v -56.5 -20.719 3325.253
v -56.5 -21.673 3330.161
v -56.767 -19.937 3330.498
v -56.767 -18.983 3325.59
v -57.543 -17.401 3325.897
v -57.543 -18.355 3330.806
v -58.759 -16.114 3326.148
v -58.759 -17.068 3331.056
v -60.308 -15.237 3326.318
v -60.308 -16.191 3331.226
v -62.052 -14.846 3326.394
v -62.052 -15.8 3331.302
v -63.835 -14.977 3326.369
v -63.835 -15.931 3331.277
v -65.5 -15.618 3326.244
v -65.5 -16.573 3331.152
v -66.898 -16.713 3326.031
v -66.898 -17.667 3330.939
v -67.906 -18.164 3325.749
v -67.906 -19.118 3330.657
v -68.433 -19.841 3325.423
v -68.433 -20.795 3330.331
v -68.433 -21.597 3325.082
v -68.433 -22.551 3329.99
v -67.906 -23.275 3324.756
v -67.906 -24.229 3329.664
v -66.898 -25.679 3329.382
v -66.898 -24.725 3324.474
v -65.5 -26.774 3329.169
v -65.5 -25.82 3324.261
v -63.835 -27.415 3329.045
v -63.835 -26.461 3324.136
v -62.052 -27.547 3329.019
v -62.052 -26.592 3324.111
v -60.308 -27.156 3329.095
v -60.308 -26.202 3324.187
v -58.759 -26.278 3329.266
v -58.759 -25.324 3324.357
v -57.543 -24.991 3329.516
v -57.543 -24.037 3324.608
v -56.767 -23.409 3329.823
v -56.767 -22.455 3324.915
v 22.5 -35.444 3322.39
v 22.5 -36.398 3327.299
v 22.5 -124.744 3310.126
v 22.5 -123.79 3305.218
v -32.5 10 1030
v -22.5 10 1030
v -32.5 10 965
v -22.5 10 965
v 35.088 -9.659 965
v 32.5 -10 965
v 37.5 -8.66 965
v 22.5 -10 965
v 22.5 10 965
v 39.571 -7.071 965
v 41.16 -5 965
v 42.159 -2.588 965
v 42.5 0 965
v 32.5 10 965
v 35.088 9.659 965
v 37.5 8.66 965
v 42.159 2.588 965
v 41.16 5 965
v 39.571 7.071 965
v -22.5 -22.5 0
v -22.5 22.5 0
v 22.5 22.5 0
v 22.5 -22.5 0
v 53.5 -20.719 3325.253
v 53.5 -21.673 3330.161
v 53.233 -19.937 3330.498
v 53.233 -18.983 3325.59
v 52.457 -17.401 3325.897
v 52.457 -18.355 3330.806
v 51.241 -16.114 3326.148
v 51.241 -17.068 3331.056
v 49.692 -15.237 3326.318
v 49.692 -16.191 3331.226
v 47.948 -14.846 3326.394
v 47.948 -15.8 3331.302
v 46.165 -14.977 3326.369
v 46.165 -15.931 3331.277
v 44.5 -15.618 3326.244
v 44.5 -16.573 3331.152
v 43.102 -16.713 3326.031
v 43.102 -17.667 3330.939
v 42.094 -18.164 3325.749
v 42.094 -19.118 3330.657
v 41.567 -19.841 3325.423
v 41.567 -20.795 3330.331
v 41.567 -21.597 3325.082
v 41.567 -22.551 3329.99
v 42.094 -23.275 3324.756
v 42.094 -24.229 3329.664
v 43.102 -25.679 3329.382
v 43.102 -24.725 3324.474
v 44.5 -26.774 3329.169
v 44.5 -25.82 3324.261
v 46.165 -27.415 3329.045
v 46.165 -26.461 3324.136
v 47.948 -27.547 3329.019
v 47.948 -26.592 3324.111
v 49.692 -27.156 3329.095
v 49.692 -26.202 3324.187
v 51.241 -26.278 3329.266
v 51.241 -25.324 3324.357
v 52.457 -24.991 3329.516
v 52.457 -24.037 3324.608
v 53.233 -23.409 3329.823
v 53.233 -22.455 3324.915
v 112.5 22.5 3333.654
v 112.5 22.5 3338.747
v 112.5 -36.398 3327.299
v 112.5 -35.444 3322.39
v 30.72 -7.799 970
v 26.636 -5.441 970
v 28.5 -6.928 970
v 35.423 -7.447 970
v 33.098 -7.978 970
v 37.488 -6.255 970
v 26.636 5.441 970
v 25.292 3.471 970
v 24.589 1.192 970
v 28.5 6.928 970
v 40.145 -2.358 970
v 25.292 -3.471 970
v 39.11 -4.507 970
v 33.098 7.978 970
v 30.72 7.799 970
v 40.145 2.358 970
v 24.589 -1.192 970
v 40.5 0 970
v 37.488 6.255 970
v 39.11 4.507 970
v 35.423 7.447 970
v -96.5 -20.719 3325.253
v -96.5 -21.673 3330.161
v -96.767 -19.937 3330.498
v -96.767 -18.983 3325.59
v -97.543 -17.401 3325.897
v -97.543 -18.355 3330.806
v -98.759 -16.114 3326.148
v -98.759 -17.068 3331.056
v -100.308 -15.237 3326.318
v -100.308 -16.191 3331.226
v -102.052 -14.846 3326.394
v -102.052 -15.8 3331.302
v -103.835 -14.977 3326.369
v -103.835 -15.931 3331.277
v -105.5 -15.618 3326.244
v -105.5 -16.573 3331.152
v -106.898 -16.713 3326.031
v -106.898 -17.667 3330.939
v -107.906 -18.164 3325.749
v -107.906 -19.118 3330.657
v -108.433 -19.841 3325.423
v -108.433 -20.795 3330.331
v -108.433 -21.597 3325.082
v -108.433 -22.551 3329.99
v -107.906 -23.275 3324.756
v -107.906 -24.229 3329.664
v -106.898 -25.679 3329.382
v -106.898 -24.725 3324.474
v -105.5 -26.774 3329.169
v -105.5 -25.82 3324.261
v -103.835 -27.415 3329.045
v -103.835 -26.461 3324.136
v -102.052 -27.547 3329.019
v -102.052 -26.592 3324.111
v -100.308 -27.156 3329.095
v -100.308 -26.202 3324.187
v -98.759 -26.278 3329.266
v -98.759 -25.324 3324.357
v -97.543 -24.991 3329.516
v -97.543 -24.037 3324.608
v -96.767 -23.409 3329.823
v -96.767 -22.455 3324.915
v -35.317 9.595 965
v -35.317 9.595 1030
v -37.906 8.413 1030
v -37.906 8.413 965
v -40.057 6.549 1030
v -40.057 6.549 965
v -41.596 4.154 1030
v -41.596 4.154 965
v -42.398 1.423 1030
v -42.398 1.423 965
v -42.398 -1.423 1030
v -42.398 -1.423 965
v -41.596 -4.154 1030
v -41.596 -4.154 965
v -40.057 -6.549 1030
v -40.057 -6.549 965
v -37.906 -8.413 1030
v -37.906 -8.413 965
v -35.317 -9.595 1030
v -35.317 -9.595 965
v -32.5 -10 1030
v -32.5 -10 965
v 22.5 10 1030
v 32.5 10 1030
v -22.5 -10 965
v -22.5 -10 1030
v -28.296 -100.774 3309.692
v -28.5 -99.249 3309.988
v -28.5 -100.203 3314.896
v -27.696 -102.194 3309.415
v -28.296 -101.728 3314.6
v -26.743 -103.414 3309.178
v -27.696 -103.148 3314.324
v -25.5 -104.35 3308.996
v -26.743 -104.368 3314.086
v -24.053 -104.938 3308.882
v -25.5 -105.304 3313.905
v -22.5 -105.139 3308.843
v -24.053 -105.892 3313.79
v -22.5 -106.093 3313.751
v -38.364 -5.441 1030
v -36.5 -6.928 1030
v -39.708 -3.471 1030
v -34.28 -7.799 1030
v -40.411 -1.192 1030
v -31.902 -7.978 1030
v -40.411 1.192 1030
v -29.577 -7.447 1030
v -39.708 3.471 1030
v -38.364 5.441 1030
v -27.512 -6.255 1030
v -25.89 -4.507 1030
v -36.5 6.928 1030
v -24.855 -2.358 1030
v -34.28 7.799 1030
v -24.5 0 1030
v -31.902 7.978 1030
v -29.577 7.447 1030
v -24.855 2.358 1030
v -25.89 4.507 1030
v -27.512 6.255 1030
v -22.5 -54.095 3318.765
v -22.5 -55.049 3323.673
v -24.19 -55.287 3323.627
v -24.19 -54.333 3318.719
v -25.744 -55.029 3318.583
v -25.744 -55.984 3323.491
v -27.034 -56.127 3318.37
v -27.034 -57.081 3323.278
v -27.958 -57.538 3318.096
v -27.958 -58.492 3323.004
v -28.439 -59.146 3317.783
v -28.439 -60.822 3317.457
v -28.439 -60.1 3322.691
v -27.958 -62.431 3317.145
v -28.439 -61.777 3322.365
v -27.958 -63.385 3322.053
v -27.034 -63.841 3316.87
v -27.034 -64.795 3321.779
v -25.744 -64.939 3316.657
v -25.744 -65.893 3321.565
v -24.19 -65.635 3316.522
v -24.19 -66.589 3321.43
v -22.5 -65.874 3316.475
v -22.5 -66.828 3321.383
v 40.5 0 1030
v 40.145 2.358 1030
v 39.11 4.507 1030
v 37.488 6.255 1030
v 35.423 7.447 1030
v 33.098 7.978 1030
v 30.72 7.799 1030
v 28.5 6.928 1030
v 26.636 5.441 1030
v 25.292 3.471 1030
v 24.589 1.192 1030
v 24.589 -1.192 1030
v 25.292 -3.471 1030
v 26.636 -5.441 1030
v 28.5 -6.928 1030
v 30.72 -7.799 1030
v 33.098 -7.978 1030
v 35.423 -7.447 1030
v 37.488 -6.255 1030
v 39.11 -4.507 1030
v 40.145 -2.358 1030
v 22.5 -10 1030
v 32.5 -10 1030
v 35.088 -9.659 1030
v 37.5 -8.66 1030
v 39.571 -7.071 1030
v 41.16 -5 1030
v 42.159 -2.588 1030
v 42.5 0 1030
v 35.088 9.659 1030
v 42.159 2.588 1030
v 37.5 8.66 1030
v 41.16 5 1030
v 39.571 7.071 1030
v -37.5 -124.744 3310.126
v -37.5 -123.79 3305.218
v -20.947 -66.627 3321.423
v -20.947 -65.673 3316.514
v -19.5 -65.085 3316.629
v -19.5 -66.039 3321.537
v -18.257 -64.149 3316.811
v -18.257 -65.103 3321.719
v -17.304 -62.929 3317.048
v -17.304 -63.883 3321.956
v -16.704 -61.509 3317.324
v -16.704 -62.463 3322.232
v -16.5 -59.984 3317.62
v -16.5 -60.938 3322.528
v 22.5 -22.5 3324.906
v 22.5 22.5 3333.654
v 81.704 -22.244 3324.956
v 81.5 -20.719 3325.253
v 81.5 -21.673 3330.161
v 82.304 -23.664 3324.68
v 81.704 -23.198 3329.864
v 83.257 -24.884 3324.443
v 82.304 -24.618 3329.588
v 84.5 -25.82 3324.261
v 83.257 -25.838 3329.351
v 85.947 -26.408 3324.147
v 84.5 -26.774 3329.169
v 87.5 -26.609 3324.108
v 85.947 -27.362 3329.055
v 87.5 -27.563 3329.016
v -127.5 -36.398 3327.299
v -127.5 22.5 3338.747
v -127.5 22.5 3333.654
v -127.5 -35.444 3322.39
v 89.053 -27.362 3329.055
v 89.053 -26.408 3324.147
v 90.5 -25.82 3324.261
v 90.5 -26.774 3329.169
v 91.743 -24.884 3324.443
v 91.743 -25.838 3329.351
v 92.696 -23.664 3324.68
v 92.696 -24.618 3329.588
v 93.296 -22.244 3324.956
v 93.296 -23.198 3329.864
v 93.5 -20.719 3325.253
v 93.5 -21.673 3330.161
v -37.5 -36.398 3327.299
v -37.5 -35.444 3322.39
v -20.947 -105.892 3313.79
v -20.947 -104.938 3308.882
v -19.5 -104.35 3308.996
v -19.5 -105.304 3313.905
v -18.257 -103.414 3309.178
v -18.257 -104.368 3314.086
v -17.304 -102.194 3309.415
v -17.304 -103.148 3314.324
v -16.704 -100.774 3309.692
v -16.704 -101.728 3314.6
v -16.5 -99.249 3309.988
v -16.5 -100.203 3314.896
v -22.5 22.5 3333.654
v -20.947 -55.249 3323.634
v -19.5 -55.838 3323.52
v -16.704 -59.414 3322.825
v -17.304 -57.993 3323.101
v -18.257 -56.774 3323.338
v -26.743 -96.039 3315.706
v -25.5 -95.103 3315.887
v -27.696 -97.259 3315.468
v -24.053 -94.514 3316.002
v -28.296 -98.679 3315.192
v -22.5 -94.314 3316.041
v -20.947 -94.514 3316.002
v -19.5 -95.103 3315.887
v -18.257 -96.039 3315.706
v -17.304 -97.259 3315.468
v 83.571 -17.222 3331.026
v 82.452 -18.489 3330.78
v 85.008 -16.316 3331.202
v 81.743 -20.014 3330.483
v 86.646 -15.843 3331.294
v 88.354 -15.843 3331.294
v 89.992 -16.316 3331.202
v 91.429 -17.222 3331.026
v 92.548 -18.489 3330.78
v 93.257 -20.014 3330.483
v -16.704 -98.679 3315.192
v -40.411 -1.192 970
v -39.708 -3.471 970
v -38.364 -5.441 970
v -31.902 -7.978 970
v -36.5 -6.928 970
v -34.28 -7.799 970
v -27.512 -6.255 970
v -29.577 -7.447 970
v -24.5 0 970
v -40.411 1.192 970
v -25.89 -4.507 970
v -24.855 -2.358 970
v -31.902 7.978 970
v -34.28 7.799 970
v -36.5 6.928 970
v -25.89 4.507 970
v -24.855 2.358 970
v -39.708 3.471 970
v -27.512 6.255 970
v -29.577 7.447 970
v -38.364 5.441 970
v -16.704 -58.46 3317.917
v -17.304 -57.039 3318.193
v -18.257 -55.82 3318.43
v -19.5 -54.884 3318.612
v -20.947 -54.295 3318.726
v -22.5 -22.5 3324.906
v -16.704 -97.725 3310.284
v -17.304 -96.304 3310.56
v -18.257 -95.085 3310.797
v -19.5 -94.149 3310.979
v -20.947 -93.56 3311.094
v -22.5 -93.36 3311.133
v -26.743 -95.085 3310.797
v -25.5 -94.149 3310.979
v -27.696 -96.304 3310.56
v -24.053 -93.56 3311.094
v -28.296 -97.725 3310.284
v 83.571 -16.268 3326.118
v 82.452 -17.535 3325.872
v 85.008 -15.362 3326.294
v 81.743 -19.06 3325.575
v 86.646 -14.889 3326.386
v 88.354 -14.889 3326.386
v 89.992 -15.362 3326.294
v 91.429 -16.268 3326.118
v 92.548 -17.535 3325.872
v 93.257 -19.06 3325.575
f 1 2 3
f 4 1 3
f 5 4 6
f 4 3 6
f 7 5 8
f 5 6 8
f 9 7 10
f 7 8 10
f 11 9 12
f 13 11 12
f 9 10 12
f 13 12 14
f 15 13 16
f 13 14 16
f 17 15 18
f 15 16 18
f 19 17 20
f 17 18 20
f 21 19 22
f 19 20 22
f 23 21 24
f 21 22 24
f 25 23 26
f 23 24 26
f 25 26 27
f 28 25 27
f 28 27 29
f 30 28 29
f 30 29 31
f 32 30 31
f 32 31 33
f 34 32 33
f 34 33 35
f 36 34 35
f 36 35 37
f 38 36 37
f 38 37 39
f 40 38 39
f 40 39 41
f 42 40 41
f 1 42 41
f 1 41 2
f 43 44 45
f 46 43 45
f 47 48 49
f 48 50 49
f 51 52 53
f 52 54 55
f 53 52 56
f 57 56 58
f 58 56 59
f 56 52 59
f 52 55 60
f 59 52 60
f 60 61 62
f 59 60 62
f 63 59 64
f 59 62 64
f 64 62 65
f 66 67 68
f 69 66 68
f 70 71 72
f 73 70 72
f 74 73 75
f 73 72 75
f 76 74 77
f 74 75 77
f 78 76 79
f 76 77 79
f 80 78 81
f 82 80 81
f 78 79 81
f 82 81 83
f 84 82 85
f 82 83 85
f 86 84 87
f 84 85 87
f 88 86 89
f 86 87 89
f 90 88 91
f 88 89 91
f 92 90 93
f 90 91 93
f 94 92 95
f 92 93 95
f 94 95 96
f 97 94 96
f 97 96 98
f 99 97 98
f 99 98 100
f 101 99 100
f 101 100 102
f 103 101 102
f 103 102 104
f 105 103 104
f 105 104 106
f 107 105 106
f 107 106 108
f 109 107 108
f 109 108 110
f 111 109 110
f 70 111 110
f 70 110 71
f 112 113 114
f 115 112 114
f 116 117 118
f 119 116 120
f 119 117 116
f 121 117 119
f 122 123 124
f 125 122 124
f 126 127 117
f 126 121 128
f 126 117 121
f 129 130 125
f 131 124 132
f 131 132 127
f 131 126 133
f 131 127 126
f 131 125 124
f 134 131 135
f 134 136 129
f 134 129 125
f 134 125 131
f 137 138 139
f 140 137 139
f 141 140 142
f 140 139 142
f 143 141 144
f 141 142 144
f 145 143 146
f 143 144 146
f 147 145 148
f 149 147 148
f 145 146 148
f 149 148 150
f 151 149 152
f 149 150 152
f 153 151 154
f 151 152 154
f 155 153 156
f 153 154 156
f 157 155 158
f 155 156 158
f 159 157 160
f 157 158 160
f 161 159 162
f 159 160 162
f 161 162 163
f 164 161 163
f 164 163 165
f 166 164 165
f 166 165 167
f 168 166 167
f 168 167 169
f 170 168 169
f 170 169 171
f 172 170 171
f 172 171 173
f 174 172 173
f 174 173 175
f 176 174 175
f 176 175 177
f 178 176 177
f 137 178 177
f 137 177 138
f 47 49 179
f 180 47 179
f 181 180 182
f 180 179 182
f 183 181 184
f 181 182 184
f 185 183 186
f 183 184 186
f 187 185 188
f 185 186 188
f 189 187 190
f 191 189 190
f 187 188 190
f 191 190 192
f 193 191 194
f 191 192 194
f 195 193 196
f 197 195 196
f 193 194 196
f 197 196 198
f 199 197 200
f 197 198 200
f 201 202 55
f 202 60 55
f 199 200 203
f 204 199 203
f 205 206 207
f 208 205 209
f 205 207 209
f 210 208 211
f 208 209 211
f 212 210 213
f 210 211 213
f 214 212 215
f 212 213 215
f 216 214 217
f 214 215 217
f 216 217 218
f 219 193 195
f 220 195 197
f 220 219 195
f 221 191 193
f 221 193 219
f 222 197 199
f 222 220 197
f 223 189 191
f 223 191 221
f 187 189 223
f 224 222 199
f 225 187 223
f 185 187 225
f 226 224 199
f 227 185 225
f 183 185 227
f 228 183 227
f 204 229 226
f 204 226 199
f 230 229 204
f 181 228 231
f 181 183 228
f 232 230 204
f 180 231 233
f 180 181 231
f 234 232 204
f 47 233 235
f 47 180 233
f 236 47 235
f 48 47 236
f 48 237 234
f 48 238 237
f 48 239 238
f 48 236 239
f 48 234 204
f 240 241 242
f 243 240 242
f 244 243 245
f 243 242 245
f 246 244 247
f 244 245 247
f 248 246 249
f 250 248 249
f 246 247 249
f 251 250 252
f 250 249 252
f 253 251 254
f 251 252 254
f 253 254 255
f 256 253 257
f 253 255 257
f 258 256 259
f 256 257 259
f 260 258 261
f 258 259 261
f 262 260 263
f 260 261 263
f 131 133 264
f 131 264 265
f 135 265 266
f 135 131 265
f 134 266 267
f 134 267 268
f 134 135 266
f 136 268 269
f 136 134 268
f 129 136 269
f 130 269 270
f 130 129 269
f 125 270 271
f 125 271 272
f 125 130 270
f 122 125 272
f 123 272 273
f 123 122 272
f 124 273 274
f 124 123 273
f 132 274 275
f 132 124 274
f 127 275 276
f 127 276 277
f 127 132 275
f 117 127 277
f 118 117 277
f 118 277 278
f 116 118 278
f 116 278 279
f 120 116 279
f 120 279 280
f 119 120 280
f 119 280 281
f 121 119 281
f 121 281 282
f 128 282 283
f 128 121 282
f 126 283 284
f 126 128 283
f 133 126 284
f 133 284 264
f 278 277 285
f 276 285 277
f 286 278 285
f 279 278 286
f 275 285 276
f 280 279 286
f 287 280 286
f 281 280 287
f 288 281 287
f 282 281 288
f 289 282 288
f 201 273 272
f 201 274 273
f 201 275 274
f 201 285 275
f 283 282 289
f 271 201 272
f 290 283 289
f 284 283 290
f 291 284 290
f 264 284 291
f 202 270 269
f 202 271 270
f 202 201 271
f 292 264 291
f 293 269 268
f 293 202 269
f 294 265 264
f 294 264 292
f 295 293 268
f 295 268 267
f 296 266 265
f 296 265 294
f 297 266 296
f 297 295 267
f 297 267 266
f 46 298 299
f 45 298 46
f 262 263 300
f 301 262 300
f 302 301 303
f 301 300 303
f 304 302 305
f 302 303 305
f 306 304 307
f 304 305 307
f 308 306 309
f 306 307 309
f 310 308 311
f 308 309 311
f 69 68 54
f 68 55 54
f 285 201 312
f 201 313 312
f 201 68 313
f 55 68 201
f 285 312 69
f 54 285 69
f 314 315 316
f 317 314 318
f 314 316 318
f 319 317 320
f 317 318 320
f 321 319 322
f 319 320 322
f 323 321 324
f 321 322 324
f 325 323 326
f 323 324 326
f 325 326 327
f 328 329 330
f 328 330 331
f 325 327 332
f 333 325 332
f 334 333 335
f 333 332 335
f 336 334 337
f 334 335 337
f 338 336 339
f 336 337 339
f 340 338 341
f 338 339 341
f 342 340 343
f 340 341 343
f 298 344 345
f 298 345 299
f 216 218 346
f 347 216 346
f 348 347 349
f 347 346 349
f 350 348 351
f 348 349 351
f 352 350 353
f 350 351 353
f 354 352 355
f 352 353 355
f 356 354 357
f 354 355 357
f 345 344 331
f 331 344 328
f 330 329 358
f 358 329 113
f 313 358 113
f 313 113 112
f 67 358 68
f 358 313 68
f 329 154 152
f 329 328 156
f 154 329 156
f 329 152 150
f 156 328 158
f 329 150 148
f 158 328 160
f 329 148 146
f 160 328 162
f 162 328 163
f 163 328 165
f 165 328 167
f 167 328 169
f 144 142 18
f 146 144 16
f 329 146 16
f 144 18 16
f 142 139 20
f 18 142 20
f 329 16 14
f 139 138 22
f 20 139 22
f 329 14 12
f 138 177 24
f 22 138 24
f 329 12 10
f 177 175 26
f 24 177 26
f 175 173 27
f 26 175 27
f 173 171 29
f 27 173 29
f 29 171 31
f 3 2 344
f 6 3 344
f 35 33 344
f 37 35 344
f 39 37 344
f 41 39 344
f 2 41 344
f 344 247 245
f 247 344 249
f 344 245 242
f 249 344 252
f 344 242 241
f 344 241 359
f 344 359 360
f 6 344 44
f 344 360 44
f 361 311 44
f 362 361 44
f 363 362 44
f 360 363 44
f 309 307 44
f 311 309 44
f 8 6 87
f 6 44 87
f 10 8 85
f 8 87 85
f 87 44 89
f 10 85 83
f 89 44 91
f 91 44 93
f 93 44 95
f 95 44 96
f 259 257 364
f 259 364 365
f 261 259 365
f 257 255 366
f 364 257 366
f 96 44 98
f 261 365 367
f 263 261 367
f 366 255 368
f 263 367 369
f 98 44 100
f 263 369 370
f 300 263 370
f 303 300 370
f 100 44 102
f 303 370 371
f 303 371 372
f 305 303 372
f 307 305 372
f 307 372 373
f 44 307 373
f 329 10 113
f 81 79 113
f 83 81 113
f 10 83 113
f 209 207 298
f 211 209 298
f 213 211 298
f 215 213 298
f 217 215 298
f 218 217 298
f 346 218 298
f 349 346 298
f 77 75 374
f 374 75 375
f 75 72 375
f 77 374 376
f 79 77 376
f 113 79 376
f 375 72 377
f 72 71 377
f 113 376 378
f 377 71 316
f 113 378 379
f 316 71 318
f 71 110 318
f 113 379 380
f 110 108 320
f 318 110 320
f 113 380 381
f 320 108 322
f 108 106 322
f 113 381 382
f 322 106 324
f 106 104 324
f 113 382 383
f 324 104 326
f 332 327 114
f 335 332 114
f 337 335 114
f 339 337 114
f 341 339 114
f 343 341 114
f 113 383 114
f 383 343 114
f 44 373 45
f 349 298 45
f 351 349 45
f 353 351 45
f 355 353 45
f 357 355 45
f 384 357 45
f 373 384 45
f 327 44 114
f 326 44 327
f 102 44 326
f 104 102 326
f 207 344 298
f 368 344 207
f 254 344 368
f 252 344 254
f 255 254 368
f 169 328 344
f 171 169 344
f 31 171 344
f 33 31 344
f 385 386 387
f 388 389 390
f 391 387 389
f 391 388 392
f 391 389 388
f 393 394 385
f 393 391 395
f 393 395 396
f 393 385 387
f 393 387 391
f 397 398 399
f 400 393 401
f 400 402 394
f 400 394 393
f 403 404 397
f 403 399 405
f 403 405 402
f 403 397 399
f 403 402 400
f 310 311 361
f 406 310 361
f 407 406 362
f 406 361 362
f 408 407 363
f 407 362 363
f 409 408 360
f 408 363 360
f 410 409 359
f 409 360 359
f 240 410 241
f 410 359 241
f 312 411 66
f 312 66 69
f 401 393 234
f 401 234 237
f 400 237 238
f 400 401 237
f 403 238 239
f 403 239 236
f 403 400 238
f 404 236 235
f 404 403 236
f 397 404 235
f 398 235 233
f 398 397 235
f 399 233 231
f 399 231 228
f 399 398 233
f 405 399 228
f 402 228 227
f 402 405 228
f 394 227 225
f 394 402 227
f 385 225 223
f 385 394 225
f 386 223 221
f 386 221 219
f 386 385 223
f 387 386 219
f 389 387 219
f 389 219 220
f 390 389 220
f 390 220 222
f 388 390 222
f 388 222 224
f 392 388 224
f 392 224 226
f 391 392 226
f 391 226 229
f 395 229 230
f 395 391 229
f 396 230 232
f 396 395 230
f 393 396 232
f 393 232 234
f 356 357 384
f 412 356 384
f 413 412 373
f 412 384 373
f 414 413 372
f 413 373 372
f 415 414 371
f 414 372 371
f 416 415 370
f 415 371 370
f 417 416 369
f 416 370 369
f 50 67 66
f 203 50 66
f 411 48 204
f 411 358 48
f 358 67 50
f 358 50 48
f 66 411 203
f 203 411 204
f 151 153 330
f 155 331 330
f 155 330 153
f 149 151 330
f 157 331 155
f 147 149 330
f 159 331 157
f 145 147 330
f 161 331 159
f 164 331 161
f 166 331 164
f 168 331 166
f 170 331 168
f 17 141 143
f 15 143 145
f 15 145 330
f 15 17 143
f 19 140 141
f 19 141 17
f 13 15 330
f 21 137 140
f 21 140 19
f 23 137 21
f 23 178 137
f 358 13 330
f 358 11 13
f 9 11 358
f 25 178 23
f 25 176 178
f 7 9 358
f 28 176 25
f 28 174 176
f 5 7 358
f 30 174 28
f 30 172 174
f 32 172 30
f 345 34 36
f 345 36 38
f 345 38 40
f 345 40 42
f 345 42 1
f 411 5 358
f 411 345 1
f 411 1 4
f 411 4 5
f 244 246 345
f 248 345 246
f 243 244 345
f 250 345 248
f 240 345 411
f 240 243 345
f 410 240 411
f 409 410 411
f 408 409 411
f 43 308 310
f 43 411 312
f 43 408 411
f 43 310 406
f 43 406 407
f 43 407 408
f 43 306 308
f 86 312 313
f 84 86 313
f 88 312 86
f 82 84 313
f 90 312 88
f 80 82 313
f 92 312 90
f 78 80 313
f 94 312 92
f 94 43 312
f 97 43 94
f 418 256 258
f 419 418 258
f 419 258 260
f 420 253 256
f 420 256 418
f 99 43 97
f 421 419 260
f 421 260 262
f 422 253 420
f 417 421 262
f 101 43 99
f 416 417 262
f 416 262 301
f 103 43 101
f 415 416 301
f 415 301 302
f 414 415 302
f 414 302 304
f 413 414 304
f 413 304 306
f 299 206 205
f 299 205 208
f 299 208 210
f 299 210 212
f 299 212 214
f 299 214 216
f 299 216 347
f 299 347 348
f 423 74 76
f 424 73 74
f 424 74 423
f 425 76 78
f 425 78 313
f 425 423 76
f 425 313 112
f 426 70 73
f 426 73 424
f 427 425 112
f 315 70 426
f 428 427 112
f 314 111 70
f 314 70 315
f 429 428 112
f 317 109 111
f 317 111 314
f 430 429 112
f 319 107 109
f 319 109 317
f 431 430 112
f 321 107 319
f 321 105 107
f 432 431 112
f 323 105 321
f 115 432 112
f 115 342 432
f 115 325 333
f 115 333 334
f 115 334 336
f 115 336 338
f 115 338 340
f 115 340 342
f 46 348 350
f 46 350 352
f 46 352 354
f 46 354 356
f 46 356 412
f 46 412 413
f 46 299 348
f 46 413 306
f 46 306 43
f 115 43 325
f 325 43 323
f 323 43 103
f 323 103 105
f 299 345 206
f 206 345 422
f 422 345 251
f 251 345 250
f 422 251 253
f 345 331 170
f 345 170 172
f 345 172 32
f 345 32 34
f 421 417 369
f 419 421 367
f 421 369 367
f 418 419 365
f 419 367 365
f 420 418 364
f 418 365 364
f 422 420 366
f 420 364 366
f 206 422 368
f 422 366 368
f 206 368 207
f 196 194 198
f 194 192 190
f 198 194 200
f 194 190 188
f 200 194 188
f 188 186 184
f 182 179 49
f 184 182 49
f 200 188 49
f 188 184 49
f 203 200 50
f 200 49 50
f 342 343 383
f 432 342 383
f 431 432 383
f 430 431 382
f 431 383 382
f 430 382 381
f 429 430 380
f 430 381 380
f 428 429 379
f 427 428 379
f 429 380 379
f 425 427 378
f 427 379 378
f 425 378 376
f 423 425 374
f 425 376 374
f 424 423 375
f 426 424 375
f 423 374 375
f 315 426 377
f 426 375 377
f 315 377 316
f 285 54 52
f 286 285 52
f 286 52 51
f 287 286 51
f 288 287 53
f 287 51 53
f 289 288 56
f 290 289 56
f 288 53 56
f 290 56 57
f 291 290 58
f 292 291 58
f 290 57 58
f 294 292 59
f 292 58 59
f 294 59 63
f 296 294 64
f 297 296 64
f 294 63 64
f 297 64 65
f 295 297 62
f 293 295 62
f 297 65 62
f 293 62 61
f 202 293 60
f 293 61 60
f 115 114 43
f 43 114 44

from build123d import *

# Parameters (mm, degrees)
F0_W      = 45
F0_H      = 45
F1_DEPTH  = 3330
F4_DEPTH  = 5
F5_R      = 8
F6_DEPTH  = 60
F9_W      = 45
F9_H      = 45.842251273
F10_DEPTH = 25
F11_W     = 60
F11_H     = 60
F11_W_2   = 90
F11_H_2   = 90
F12_DEPTH = 5
F13_R     = 6
F14_DEPTH = 25
F15_W     = 150
F15_H     = 4.7702248844
F16_DEPTH = 3358.6871623993
F18_DEPTH = 106.2


with BuildPart() as f1:
    # F0 (on Top) → F1 (new body)
    with BuildSketch(Plane.XY):
        Rectangle(F0_W, F0_H)
    extrude(amount=F1_DEPTH)

    # F3 (on offset) → F4 (join)
    with BuildSketch(Plane.XY.offset(965)):
        with BuildLine():
            Line((22.5, 2), (22.5, 0))
            ThreePointArc((22.5, 0), (22.5506384699, 1.0050896201), (22.7020410289, 2))
            Line((22.7020410289, 2), (22.5, 2))
        make_face()
        with BuildLine():
            ThreePointArc((22.7020410289, 2), (22.5506384699, 1.0050896201), (22.5, 0))
            Line((22.5, 0), (32.5, 0))
            Line((32.5, 0), (32.5, 2))
            Line((32.5, 2), (22.7020410289, 2))
        make_face()
        with BuildLine():
            Line((32.5, 0), (22.5, 0))
            ThreePointArc((22.5, 0), (22.5506384699, -1.0050896201), (22.7020410289, -2))
            Line((22.7020410289, -2), (32.5, -2))
            Line((32.5, -2), (32.5, 0))
        make_face()
        with BuildLine():
            ThreePointArc((22.7020410289, -2), (22.5506384699, -1.0050896201), (22.5, 0))
            Line((22.5, 0), (22.5, -2))
            Line((22.5, -2), (22.7020410289, -2))
        make_face()
        with BuildLine():
            Line((-22.4843378865, -10), (-22.4843378865, 0))
            Line((-22.4843378865, 0), (-22.5, 0))
            ThreePointArc((-22.5, 0), (-25.4289321881, -7.0710678119), (-32.5, -10))
            Line((-32.5, -10), (-22.4843378865, -10))
        make_face()
        with BuildLine():
            Line((-22.5, 0), (-22.4843378865, 0))
            Line((-22.4843378865, 0), (-22.4843378865, 10))
            Line((-22.4843378865, 10), (-32.5, 10))
            ThreePointArc((-32.5, 10), (-25.4289321881, 7.0710678119), (-22.5, 0))
        make_face()
        with BuildLine():
            Line((32.5, 2), (32.5, 0))
            Line((32.5, 0), (32.5, -2))
            Line((32.5, -2), (32.5, -10))
            ThreePointArc((32.5, -10), (39.5710678119, -7.0710678119), (42.5, 0))
            ThreePointArc((42.5, 0), (39.5710678119, 7.0710678119), (32.5, 10))
            Line((32.5, 10), (32.5, 2))
        make_face()
        with BuildLine():
            Line((22.5, 2), (22.7020410289, 2))
            ThreePointArc((22.7020410289, 2), (26.1754446797, 7.7459666924), (32.5, 10))
            Line((32.5, 10), (22.5, 10))
            Line((22.5, 10), (22.5, 2))
        make_face()
        with BuildLine():
            ThreePointArc((32.5, 10), (26.1754446797, 7.7459666924), (22.7020410289, 2))
            Line((22.7020410289, 2), (32.5, 2))
            Line((32.5, 2), (32.5, 10))
        make_face()
        with BuildLine():
            Line((32.5, -2), (22.7020410289, -2))
            ThreePointArc((22.7020410289, -2), (26.1754446797, -7.7459666924), (32.5, -10))
            Line((32.5, -10), (32.5, -2))
        make_face()
        with BuildLine():
            ThreePointArc((32.5, -10), (26.1754446797, -7.7459666924), (22.7020410289, -2))
            Line((22.7020410289, -2), (22.5, -2))
            Line((22.5, -2), (22.5, -10))
            Line((22.5, -10), (32.5, -10))
        make_face()
        with BuildLine():
            ThreePointArc((-32.5, -10), (-25.4289321881, -7.0710678119), (-22.5, 0))
            ThreePointArc((-22.5, 0), (-25.4289321881, 7.0710678119), (-32.5, 10))
            ThreePointArc((-32.5, 10), (-42.5, 0), (-32.5, -10))
        make_face()
    extrude(amount=F4_DEPTH)

    # F5 (on face) → F6 (join)
    with BuildSketch(Plane.XY.offset(970)):
        with BuildLine():
            ThreePointArc((32.5, -10), (39.5710678119, -7.0710678119), (42.5, 0))
            ThreePointArc((42.5, 0), (39.5710678119, 7.0710678119), (32.5, 10))
            ThreePointArc((32.5, 10), (25.4289321881, 7.0710678119), (22.5, 0))
            ThreePointArc((22.5, 0), (25.4289321881, -7.0710678119), (32.5, -10))
        make_face()
        with Locations((32.5, 0)):
            Circle(F5_R, mode=Mode.SUBTRACT)
        with BuildLine():
            ThreePointArc((-32.5, -10), (-25.4289321881, -7.0710678119), (-22.5, 0))
            ThreePointArc((-22.5, 0), (-25.4289321881, 7.0710678119), (-32.5, 10))
            ThreePointArc((-32.5, 10), (-42.5, 0), (-32.5, -10))
        make_face()
        with Locations((-32.5, 0)):
            Circle(F5_R, mode=Mode.SUBTRACT)
        with BuildLine():
            Line((-22.5, -10), (-22.5, 0))
            ThreePointArc((-22.5, 0), (-25.4289321881, -7.0710678119), (-32.5, -10))
            Line((-32.5, -10), (-22.5, -10))
        make_face()
        with BuildLine():
            ThreePointArc((-32.5, 10), (-25.4289321881, 7.0710678119), (-22.5, 0))
            Line((-22.5, 0), (-22.5, 10))
            Line((-22.5, 10), (-32.5, 10))
        make_face()
        with BuildLine():
            ThreePointArc((22.5, 0), (25.4289321881, 7.0710678119), (32.5, 10))
            Line((32.5, 10), (22.5, 10))
            Line((22.5, 10), (22.5, 0))
        make_face()
        with BuildLine():
            Line((22.5, -10), (32.5, -10))
            ThreePointArc((32.5, -10), (25.4289321881, -7.0710678119), (22.5, 0))
            Line((22.5, 0), (22.5, -10))
        make_face()
    extrude(amount=F6_DEPTH)

    # F9 (on face) → F10 (join)
    with BuildSketch(Plane(origin=(0, -624.5391596736, 3212.9754420296), x_dir=(1, 0, 0), z_dir=(0, 0.1908089954, -0.9816271834))):
        with Locations((0, -636.2284686128)):
            Rectangle(F9_W, F9_H)
    extrude(amount=F10_DEPTH)

    # F11 (on face) → F12 (join)
    with BuildSketch(Plane(origin=(0, -624.5391596736, 3212.9754420296), x_dir=(1, 0, 0), z_dir=(0, 0.1908089954, -0.9816271834))):
        with Locations((-7.5, -629.1495942493)):
            Rectangle(F11_W, F11_H)
        with Locations((-82.5, -629.1495942493)):
            Rectangle(F11_W_2, F11_H)
        with Locations((67.5, -629.1495942493)):
            Rectangle(F11_W_2, F11_H)
        with Locations((-7.5, -554.1495942493)):
            Rectangle(F11_W, F11_H_2)
    extrude(amount=F12_DEPTH)

    # F13 (on face) → F14 (cut)
    with BuildSketch(Plane(origin=(0, -624.5391596736, 3212.9754420296), x_dir=(1, 0, 0), z_dir=(0, -0.1908089954, 0.9816271834))):
        with BuildLine():
            Line((-28.5, 534.1495942493), (-22.5, 534.1495942493))
            Line((-22.5, 534.1495942493), (-22.5, 540.1495942493))
            ThreePointArc((-22.5, 540.1495942493), (-26.7426406871, 538.3922349364), (-28.5, 534.1495942493))
        make_face()
        with BuildLine():
            Line((-22.5, 540.1495942493), (-22.5, 534.1495942493))
            Line((-22.5, 534.1495942493), (-22.5, 528.1495942493))
            ThreePointArc((-22.5, 528.1495942493), (-18.2573593129, 529.9069535622), (-16.5, 534.1495942493))
            ThreePointArc((-16.5, 534.1495942493), (-18.2573593129, 538.3922349364), (-22.5, 540.1495942493))
        make_face()
        with BuildLine():
            Line((-22.5, 528.1495942493), (-22.5, 534.1495942493))
            Line((-22.5, 534.1495942493), (-28.5, 534.1495942493))
            ThreePointArc((-28.5, 534.1495942493), (-26.7426406871, 529.9069535622), (-22.5, 528.1495942493))
        make_face()
        with BuildLine():
            ThreePointArc((-22.5, 580.1495942493), (-28.5, 574.1495942493), (-22.5, 568.1495942493))
            Line((-22.5, 568.1495942493), (-22.5, 574.1495942493))
            Line((-22.5, 574.1495942493), (-22.5, 580.1495942493))
        make_face()
        with BuildLine():
            Line((-22.5, 574.1495942493), (-22.5, 568.1495942493))
            ThreePointArc((-22.5, 568.1495942493), (-18.2573593129, 569.9069535622), (-16.5, 574.1495942493))
            ThreePointArc((-16.5, 574.1495942493), (-18.2573593129, 578.3922349364), (-22.5, 580.1495942493))
            Line((-22.5, 580.1495942493), (-22.5, 574.1495942493))
        make_face()
        with BuildLine():
            ThreePointArc((81.5, 614.1495942493), (83.2573593129, 609.9069535622), (87.5, 608.1495942493))
            Line((87.5, 608.1495942493), (87.5, 614.1495942493))
            Line((87.5, 614.1495942493), (81.5, 614.1495942493))
        make_face()
        with Locations((47.5, 614.1495942493)):
            Circle(F13_R)
        with BuildLine():
            Line((87.5, 614.1495942493), (87.5, 608.1495942493))
            ThreePointArc((87.5, 608.1495942493), (91.7426406871, 609.9069535622), (93.5, 614.1495942493))
            ThreePointArc((93.5, 614.1495942493), (87.5, 620.1495942493), (81.5, 614.1495942493))
            Line((81.5, 614.1495942493), (87.5, 614.1495942493))
        make_face()
        with Locations((-62.5, 614.1495942493)):
            Circle(F13_R)
        with Locations((-102.5, 614.1495942493)):
            Circle(F13_R)
    extrude(amount=-F14_DEPTH, mode=Mode.SUBTRACT)

    # F15 (on Top) → F16 (cut)
    with BuildSketch(Plane.XY):
        with Locations((52.5, 24.8851124422)):
            Rectangle(F15_W, F15_H)
    extrude(amount=F16_DEPTH, mode=Mode.SUBTRACT)

    # F17 (on face) → F18 (cut)
    with BuildSketch(Plane.YZ.offset(-22.5)):
        Polygon((22.5, 3338.7471139112), (22.5, 3333.6535304364), (23.4540449769, 3333.838977994), align=None)
    extrude(amount=-F18_DEPTH, mode=Mode.SUBTRACT)


solid = f1.part
